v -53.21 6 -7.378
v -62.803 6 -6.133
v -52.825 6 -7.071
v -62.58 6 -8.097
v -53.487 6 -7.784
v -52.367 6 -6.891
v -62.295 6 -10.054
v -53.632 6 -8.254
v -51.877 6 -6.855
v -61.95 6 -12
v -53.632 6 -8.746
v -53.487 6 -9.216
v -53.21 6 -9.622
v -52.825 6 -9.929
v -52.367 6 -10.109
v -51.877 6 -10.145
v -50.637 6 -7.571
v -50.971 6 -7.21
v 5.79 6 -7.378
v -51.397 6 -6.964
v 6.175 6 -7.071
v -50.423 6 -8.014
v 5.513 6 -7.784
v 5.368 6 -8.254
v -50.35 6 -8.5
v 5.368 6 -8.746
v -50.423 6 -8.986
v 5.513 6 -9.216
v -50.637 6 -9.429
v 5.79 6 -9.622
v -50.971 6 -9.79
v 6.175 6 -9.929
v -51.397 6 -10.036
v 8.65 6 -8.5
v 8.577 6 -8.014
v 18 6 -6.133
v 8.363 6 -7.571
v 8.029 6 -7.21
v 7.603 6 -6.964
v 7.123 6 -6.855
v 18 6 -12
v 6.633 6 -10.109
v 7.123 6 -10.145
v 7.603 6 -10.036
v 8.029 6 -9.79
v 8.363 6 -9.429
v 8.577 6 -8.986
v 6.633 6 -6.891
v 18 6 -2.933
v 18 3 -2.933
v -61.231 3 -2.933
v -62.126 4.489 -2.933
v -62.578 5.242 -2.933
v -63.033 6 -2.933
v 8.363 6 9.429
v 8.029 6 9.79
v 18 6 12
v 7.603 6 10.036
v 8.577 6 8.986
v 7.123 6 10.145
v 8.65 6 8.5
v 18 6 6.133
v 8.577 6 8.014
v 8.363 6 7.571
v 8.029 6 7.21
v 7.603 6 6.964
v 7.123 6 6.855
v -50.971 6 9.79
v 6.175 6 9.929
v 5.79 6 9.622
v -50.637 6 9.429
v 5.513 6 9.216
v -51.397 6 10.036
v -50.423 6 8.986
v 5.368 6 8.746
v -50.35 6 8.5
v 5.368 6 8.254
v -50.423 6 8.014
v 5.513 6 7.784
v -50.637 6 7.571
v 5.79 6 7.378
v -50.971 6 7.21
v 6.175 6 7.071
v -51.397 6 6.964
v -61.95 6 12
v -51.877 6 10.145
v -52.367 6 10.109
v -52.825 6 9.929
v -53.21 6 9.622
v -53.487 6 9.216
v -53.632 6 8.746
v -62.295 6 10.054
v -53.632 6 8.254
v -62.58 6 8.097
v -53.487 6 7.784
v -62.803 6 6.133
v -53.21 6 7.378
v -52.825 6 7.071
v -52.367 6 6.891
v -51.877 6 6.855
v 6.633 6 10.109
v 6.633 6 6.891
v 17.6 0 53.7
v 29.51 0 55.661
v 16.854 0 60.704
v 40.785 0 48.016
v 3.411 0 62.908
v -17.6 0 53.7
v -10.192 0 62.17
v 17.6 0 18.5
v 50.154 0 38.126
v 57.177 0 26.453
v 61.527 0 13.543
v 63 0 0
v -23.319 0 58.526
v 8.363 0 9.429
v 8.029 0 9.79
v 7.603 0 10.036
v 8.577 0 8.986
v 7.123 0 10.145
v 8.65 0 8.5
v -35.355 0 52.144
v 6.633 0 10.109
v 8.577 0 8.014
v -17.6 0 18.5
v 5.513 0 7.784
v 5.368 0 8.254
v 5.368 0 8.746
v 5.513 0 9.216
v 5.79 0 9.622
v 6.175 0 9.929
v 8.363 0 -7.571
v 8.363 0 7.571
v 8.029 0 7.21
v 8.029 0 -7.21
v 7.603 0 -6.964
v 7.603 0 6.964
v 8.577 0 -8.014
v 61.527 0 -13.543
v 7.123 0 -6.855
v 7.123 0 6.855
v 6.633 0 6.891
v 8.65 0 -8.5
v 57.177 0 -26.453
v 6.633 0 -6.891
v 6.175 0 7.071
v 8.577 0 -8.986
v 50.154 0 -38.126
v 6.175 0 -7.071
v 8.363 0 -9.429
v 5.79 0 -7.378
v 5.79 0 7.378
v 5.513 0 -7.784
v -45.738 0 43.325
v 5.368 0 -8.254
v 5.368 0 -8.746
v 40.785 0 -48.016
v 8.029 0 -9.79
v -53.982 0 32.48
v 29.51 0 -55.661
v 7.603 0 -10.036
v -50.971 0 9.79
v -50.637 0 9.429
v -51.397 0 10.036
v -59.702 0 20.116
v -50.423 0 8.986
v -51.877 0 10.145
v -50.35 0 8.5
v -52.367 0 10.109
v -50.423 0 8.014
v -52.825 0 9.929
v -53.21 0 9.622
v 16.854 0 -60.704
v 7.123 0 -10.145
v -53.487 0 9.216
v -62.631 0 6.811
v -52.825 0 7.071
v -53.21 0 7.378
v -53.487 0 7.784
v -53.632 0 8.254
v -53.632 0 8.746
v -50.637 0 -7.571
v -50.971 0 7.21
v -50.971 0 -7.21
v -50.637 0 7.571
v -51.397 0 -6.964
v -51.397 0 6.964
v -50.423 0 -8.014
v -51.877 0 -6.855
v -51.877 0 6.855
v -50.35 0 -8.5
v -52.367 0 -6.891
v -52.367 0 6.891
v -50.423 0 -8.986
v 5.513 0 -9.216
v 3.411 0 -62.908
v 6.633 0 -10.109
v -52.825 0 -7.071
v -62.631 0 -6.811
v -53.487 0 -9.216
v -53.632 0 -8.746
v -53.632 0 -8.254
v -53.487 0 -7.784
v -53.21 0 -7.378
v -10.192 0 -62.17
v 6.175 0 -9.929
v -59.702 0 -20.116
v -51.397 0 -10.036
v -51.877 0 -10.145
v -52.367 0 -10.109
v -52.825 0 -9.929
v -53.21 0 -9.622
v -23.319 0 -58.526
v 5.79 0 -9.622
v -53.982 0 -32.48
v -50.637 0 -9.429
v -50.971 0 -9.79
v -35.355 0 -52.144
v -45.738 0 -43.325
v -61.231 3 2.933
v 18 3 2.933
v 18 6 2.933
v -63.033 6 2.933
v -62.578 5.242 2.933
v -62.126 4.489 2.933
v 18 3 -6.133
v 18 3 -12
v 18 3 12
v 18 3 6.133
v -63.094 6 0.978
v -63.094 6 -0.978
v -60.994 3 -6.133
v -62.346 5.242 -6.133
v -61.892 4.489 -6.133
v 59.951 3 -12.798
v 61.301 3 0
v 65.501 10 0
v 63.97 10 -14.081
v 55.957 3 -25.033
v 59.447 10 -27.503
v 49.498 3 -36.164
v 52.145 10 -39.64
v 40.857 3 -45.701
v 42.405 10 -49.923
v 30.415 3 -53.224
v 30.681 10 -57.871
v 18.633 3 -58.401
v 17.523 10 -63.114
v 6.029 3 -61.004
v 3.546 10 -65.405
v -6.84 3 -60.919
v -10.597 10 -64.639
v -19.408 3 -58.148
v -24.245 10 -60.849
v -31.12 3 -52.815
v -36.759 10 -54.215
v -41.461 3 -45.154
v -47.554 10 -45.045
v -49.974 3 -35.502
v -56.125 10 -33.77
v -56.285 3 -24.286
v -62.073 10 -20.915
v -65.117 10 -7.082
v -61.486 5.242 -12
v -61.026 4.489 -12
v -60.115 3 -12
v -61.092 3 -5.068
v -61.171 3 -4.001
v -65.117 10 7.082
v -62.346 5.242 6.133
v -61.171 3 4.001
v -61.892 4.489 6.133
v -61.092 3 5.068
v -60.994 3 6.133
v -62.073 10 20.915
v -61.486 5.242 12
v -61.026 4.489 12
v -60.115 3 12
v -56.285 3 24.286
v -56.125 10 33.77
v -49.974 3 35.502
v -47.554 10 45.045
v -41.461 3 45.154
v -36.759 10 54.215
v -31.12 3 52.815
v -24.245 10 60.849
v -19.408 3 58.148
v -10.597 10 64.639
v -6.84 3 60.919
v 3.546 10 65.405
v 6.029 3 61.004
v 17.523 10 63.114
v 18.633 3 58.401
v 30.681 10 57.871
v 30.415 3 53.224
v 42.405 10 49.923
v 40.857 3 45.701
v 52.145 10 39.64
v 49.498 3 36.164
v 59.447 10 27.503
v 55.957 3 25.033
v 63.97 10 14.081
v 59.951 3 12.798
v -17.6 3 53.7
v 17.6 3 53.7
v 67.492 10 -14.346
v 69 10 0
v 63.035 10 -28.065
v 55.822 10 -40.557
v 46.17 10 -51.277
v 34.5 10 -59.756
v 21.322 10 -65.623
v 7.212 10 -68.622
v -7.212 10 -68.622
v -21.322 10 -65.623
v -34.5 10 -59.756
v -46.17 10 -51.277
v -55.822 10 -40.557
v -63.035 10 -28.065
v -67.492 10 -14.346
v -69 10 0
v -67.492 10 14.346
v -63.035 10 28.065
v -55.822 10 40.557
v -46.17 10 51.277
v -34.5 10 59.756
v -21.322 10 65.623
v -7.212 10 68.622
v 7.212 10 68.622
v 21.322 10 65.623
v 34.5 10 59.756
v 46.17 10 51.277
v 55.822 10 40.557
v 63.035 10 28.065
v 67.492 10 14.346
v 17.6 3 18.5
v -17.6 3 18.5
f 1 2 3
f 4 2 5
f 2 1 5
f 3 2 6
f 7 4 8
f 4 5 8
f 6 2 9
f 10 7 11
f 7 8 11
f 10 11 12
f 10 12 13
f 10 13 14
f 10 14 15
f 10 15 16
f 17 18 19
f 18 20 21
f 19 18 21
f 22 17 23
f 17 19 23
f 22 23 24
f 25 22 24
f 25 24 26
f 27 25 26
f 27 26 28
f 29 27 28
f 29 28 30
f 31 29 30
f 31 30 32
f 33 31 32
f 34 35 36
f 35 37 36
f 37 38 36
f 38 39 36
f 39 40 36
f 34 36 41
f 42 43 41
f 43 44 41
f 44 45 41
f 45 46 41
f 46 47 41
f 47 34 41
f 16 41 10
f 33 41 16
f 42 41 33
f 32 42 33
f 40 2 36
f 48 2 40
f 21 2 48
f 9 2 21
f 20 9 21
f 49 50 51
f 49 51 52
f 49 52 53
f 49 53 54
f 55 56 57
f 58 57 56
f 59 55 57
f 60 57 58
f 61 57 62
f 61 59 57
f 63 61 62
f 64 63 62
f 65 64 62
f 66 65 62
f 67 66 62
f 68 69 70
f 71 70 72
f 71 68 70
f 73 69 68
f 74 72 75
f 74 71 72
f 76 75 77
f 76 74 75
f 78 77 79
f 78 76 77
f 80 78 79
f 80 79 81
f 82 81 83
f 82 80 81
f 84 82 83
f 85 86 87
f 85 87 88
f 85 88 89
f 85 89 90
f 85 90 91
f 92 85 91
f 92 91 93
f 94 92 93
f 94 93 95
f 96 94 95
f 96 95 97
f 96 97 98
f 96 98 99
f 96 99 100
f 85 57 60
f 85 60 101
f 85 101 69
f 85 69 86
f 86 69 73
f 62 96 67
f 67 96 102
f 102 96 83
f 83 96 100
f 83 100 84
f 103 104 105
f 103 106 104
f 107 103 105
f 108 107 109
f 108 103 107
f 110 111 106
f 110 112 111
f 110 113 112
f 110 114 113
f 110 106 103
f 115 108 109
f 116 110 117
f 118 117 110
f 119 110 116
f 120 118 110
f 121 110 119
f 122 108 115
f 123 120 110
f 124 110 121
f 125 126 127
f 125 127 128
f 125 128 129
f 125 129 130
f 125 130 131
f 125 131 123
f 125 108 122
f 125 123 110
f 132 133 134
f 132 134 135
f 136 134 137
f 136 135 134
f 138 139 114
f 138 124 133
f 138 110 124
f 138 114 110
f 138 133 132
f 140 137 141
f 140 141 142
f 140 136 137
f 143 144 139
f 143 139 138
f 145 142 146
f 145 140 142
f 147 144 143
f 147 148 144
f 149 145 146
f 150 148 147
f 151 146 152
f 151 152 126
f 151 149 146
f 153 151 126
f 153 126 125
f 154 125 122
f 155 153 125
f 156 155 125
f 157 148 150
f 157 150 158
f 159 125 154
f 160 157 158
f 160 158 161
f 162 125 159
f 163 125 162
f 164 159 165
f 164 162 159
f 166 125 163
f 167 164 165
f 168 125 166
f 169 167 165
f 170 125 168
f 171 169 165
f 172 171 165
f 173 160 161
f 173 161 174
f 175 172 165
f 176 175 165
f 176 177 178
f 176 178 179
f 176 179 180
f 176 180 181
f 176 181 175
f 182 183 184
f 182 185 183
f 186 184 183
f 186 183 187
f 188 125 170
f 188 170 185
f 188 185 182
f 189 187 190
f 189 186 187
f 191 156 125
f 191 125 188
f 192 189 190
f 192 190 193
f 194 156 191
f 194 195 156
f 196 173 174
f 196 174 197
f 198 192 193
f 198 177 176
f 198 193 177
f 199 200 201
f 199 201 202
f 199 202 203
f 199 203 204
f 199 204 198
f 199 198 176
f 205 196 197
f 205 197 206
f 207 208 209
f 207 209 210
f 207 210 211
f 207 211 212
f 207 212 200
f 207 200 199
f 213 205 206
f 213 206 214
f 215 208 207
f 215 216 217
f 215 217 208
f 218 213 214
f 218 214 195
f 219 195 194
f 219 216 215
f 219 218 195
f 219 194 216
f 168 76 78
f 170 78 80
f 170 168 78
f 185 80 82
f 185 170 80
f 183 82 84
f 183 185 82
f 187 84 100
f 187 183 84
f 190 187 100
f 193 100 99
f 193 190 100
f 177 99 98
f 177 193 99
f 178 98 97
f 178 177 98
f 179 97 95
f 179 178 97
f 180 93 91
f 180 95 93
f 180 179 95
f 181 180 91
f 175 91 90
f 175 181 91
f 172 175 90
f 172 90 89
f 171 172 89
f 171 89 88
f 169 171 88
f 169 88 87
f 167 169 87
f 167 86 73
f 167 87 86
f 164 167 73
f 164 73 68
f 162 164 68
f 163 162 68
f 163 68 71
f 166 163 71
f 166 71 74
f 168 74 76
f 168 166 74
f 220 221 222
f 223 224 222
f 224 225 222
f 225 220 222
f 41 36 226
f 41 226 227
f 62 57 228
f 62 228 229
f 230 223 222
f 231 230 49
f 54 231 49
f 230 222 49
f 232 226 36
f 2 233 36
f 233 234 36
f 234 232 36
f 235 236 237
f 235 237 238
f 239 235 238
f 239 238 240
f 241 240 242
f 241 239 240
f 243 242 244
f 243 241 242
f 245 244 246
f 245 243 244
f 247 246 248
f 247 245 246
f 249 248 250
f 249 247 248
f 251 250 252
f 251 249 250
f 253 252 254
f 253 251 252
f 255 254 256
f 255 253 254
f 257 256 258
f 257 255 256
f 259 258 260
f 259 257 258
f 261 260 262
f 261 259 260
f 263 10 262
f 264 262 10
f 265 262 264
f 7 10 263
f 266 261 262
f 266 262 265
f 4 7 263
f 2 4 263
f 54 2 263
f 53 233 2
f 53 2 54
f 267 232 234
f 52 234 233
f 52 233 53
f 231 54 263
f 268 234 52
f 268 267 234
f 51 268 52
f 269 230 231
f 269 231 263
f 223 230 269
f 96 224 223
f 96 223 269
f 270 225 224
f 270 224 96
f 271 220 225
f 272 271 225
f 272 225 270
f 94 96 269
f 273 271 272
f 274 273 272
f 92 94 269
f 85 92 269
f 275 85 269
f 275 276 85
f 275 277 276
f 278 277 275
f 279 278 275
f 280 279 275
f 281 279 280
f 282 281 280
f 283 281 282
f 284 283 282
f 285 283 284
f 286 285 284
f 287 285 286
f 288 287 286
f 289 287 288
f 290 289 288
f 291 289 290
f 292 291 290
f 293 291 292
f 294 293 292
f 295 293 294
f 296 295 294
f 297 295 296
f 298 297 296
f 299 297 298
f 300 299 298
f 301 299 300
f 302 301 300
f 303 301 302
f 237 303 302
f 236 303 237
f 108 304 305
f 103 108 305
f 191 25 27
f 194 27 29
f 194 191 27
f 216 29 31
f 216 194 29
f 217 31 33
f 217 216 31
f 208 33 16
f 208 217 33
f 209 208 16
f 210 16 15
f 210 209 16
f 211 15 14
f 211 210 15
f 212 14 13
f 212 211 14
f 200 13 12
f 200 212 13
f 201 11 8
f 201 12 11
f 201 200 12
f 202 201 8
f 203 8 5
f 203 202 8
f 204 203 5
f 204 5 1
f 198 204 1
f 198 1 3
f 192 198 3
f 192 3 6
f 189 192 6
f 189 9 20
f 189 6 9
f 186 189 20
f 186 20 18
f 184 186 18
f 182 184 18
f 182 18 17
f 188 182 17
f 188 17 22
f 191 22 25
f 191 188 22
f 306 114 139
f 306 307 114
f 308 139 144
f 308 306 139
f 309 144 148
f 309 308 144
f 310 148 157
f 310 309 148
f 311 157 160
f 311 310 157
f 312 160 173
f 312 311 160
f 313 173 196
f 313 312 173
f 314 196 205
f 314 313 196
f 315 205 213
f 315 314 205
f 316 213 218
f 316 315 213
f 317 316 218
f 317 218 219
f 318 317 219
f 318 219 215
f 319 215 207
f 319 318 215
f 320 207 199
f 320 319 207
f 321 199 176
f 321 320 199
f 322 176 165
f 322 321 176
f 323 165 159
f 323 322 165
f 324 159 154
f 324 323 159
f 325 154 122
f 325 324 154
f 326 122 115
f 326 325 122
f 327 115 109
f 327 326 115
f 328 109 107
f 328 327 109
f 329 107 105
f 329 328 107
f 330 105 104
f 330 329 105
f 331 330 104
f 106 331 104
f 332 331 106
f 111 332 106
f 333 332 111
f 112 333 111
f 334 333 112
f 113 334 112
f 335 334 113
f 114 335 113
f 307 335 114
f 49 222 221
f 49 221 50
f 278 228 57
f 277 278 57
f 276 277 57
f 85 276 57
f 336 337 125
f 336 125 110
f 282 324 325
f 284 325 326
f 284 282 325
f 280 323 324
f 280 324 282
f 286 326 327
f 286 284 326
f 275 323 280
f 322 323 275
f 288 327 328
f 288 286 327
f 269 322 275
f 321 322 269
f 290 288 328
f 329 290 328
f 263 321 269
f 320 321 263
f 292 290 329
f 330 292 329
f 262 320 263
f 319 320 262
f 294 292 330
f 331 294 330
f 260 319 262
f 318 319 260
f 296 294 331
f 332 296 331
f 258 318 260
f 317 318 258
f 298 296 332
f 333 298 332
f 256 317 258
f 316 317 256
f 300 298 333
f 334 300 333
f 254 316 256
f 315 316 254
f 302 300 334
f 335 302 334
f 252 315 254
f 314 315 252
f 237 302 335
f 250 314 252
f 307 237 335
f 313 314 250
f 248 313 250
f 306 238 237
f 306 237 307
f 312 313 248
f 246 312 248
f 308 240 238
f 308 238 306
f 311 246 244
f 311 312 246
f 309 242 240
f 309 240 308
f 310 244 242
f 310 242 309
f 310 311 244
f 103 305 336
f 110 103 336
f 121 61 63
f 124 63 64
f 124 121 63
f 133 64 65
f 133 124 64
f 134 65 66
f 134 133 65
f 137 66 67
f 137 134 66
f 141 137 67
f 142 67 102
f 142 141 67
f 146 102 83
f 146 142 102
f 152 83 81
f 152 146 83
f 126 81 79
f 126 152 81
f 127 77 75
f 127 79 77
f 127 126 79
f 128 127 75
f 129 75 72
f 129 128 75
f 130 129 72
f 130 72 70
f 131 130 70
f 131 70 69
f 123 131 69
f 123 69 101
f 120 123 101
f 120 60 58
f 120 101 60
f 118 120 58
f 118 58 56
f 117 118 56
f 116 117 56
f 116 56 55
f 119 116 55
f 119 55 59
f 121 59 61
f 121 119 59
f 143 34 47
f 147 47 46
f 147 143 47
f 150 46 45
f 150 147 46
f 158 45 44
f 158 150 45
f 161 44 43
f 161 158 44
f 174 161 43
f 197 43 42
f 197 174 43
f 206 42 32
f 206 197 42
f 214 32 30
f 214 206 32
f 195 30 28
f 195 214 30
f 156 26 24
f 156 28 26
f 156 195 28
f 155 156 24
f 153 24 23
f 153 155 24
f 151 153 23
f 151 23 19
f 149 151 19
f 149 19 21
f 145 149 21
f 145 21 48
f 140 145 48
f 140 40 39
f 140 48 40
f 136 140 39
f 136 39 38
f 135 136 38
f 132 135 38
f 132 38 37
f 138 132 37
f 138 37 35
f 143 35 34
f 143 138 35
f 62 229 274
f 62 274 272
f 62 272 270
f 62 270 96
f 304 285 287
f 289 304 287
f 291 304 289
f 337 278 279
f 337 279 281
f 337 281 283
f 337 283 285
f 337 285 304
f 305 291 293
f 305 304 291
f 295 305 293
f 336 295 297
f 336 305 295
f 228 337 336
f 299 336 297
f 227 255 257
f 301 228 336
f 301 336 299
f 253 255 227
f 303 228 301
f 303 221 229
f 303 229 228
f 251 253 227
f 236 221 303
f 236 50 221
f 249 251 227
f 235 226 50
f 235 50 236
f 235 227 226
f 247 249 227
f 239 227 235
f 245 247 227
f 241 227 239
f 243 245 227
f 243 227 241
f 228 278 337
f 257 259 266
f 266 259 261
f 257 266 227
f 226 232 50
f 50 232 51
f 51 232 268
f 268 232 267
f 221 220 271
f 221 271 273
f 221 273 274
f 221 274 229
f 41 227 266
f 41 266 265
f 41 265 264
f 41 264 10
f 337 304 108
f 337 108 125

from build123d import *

# Parameters (mm, degrees)
SKETCH2_W                = 35.2
SKETCH2_H                = 35.2
CUT_EXTRUDE1_DEPTH       = 4
SKETCH4_W                = 5.866666667
SKETCH4_H                = 3
SKETCH4_W_2              = 5.866666666
BOSS_EXTRUDE1_DEPTH      = 10
BOSS_EXTRUDE1_DEPTH_BACK = 63.5
SKETCH5_R                = 1.65
CUT_EXTRUDE2_DEPTH       = 11
SKETCH8_W                = 5.866666667
SKETCH8_H                = 3
SKETCH8_W_2              = 5.866666666
BOSS_EXTRUDE3_DEPTH      = 8


with BuildPart() as part:
    # Sketch1 → Revolve1 (revolve)
    with BuildSketch(Plane.XY):
        Polygon((0, 0), (63, 0), (69, 10), (65.501428863, 10), (61.301428863, 3), (0, 3), align=None)
    revolve(axis=Axis((0, 0, 0), (0, 1, 0)))

    # Sketch2 → Cut-Extrude1 (cut, through all)
    with BuildSketch(Plane(origin=(0, 3, 0), x_dir=(1, 0, 0), z_dir=(0, 1, 0))):
        with Locations((0, -36.1)):
            Rectangle(SKETCH2_W, SKETCH2_H)
    extrude(amount=-CUT_EXTRUDE1_DEPTH, mode=Mode.SUBTRACT)

    # Sketch4 → Boss-Extrude1 (add, two sides)
    with BuildSketch(Plane(origin=(0, 0, 0), x_dir=(0, 0, -1), z_dir=(1, 0, 0))) as boss_extrude1_sk:
        with Locations((-9.066666666, 4.5)):
            Rectangle(SKETCH4_W, SKETCH4_H)
        with Locations((0, 4.5)):
            Rectangle(SKETCH4_W_2, SKETCH4_H)
        with Locations((9.066666666, 4.5)):
            Rectangle(SKETCH4_W, SKETCH4_H)
    extrude(amount=BOSS_EXTRUDE1_DEPTH)
    extrude(boss_extrude1_sk.sketch, amount=-BOSS_EXTRUDE1_DEPTH_BACK)

    # Sketch5 → Cut-Extrude2 (cut, through all)
    with BuildSketch(Plane(origin=(0, 0, 0), x_dir=(1, 0, 0), z_dir=(0, 1, 0))):
        with Locations((7, -8.5)):
            Circle(SKETCH5_R)
        with Locations((7, 8.5)):
            Circle(SKETCH5_R)
        with Locations((-52, 8.5)):
            Circle(SKETCH5_R)
        with Locations((-52, -8.5)):
            Circle(SKETCH5_R)
    extrude(amount=CUT_EXTRUDE2_DEPTH, mode=Mode.SUBTRACT)

    # Sketch8 → Boss-Extrude3 (add)
    with BuildSketch(Plane(origin=(10, 0, 0), x_dir=(0, 0, -1), z_dir=(1, 0, 0))):
        with Locations((-9.066666666, 4.5)):
            Rectangle(SKETCH8_W, SKETCH8_H)
        with Locations((0, 4.5)):
            Rectangle(SKETCH8_W_2, SKETCH8_H)
        with Locations((9.066666666, 4.5)):
            Rectangle(SKETCH8_W, SKETCH8_H)
    extrude(amount=BOSS_EXTRUDE3_DEPTH)


solid = part.part
